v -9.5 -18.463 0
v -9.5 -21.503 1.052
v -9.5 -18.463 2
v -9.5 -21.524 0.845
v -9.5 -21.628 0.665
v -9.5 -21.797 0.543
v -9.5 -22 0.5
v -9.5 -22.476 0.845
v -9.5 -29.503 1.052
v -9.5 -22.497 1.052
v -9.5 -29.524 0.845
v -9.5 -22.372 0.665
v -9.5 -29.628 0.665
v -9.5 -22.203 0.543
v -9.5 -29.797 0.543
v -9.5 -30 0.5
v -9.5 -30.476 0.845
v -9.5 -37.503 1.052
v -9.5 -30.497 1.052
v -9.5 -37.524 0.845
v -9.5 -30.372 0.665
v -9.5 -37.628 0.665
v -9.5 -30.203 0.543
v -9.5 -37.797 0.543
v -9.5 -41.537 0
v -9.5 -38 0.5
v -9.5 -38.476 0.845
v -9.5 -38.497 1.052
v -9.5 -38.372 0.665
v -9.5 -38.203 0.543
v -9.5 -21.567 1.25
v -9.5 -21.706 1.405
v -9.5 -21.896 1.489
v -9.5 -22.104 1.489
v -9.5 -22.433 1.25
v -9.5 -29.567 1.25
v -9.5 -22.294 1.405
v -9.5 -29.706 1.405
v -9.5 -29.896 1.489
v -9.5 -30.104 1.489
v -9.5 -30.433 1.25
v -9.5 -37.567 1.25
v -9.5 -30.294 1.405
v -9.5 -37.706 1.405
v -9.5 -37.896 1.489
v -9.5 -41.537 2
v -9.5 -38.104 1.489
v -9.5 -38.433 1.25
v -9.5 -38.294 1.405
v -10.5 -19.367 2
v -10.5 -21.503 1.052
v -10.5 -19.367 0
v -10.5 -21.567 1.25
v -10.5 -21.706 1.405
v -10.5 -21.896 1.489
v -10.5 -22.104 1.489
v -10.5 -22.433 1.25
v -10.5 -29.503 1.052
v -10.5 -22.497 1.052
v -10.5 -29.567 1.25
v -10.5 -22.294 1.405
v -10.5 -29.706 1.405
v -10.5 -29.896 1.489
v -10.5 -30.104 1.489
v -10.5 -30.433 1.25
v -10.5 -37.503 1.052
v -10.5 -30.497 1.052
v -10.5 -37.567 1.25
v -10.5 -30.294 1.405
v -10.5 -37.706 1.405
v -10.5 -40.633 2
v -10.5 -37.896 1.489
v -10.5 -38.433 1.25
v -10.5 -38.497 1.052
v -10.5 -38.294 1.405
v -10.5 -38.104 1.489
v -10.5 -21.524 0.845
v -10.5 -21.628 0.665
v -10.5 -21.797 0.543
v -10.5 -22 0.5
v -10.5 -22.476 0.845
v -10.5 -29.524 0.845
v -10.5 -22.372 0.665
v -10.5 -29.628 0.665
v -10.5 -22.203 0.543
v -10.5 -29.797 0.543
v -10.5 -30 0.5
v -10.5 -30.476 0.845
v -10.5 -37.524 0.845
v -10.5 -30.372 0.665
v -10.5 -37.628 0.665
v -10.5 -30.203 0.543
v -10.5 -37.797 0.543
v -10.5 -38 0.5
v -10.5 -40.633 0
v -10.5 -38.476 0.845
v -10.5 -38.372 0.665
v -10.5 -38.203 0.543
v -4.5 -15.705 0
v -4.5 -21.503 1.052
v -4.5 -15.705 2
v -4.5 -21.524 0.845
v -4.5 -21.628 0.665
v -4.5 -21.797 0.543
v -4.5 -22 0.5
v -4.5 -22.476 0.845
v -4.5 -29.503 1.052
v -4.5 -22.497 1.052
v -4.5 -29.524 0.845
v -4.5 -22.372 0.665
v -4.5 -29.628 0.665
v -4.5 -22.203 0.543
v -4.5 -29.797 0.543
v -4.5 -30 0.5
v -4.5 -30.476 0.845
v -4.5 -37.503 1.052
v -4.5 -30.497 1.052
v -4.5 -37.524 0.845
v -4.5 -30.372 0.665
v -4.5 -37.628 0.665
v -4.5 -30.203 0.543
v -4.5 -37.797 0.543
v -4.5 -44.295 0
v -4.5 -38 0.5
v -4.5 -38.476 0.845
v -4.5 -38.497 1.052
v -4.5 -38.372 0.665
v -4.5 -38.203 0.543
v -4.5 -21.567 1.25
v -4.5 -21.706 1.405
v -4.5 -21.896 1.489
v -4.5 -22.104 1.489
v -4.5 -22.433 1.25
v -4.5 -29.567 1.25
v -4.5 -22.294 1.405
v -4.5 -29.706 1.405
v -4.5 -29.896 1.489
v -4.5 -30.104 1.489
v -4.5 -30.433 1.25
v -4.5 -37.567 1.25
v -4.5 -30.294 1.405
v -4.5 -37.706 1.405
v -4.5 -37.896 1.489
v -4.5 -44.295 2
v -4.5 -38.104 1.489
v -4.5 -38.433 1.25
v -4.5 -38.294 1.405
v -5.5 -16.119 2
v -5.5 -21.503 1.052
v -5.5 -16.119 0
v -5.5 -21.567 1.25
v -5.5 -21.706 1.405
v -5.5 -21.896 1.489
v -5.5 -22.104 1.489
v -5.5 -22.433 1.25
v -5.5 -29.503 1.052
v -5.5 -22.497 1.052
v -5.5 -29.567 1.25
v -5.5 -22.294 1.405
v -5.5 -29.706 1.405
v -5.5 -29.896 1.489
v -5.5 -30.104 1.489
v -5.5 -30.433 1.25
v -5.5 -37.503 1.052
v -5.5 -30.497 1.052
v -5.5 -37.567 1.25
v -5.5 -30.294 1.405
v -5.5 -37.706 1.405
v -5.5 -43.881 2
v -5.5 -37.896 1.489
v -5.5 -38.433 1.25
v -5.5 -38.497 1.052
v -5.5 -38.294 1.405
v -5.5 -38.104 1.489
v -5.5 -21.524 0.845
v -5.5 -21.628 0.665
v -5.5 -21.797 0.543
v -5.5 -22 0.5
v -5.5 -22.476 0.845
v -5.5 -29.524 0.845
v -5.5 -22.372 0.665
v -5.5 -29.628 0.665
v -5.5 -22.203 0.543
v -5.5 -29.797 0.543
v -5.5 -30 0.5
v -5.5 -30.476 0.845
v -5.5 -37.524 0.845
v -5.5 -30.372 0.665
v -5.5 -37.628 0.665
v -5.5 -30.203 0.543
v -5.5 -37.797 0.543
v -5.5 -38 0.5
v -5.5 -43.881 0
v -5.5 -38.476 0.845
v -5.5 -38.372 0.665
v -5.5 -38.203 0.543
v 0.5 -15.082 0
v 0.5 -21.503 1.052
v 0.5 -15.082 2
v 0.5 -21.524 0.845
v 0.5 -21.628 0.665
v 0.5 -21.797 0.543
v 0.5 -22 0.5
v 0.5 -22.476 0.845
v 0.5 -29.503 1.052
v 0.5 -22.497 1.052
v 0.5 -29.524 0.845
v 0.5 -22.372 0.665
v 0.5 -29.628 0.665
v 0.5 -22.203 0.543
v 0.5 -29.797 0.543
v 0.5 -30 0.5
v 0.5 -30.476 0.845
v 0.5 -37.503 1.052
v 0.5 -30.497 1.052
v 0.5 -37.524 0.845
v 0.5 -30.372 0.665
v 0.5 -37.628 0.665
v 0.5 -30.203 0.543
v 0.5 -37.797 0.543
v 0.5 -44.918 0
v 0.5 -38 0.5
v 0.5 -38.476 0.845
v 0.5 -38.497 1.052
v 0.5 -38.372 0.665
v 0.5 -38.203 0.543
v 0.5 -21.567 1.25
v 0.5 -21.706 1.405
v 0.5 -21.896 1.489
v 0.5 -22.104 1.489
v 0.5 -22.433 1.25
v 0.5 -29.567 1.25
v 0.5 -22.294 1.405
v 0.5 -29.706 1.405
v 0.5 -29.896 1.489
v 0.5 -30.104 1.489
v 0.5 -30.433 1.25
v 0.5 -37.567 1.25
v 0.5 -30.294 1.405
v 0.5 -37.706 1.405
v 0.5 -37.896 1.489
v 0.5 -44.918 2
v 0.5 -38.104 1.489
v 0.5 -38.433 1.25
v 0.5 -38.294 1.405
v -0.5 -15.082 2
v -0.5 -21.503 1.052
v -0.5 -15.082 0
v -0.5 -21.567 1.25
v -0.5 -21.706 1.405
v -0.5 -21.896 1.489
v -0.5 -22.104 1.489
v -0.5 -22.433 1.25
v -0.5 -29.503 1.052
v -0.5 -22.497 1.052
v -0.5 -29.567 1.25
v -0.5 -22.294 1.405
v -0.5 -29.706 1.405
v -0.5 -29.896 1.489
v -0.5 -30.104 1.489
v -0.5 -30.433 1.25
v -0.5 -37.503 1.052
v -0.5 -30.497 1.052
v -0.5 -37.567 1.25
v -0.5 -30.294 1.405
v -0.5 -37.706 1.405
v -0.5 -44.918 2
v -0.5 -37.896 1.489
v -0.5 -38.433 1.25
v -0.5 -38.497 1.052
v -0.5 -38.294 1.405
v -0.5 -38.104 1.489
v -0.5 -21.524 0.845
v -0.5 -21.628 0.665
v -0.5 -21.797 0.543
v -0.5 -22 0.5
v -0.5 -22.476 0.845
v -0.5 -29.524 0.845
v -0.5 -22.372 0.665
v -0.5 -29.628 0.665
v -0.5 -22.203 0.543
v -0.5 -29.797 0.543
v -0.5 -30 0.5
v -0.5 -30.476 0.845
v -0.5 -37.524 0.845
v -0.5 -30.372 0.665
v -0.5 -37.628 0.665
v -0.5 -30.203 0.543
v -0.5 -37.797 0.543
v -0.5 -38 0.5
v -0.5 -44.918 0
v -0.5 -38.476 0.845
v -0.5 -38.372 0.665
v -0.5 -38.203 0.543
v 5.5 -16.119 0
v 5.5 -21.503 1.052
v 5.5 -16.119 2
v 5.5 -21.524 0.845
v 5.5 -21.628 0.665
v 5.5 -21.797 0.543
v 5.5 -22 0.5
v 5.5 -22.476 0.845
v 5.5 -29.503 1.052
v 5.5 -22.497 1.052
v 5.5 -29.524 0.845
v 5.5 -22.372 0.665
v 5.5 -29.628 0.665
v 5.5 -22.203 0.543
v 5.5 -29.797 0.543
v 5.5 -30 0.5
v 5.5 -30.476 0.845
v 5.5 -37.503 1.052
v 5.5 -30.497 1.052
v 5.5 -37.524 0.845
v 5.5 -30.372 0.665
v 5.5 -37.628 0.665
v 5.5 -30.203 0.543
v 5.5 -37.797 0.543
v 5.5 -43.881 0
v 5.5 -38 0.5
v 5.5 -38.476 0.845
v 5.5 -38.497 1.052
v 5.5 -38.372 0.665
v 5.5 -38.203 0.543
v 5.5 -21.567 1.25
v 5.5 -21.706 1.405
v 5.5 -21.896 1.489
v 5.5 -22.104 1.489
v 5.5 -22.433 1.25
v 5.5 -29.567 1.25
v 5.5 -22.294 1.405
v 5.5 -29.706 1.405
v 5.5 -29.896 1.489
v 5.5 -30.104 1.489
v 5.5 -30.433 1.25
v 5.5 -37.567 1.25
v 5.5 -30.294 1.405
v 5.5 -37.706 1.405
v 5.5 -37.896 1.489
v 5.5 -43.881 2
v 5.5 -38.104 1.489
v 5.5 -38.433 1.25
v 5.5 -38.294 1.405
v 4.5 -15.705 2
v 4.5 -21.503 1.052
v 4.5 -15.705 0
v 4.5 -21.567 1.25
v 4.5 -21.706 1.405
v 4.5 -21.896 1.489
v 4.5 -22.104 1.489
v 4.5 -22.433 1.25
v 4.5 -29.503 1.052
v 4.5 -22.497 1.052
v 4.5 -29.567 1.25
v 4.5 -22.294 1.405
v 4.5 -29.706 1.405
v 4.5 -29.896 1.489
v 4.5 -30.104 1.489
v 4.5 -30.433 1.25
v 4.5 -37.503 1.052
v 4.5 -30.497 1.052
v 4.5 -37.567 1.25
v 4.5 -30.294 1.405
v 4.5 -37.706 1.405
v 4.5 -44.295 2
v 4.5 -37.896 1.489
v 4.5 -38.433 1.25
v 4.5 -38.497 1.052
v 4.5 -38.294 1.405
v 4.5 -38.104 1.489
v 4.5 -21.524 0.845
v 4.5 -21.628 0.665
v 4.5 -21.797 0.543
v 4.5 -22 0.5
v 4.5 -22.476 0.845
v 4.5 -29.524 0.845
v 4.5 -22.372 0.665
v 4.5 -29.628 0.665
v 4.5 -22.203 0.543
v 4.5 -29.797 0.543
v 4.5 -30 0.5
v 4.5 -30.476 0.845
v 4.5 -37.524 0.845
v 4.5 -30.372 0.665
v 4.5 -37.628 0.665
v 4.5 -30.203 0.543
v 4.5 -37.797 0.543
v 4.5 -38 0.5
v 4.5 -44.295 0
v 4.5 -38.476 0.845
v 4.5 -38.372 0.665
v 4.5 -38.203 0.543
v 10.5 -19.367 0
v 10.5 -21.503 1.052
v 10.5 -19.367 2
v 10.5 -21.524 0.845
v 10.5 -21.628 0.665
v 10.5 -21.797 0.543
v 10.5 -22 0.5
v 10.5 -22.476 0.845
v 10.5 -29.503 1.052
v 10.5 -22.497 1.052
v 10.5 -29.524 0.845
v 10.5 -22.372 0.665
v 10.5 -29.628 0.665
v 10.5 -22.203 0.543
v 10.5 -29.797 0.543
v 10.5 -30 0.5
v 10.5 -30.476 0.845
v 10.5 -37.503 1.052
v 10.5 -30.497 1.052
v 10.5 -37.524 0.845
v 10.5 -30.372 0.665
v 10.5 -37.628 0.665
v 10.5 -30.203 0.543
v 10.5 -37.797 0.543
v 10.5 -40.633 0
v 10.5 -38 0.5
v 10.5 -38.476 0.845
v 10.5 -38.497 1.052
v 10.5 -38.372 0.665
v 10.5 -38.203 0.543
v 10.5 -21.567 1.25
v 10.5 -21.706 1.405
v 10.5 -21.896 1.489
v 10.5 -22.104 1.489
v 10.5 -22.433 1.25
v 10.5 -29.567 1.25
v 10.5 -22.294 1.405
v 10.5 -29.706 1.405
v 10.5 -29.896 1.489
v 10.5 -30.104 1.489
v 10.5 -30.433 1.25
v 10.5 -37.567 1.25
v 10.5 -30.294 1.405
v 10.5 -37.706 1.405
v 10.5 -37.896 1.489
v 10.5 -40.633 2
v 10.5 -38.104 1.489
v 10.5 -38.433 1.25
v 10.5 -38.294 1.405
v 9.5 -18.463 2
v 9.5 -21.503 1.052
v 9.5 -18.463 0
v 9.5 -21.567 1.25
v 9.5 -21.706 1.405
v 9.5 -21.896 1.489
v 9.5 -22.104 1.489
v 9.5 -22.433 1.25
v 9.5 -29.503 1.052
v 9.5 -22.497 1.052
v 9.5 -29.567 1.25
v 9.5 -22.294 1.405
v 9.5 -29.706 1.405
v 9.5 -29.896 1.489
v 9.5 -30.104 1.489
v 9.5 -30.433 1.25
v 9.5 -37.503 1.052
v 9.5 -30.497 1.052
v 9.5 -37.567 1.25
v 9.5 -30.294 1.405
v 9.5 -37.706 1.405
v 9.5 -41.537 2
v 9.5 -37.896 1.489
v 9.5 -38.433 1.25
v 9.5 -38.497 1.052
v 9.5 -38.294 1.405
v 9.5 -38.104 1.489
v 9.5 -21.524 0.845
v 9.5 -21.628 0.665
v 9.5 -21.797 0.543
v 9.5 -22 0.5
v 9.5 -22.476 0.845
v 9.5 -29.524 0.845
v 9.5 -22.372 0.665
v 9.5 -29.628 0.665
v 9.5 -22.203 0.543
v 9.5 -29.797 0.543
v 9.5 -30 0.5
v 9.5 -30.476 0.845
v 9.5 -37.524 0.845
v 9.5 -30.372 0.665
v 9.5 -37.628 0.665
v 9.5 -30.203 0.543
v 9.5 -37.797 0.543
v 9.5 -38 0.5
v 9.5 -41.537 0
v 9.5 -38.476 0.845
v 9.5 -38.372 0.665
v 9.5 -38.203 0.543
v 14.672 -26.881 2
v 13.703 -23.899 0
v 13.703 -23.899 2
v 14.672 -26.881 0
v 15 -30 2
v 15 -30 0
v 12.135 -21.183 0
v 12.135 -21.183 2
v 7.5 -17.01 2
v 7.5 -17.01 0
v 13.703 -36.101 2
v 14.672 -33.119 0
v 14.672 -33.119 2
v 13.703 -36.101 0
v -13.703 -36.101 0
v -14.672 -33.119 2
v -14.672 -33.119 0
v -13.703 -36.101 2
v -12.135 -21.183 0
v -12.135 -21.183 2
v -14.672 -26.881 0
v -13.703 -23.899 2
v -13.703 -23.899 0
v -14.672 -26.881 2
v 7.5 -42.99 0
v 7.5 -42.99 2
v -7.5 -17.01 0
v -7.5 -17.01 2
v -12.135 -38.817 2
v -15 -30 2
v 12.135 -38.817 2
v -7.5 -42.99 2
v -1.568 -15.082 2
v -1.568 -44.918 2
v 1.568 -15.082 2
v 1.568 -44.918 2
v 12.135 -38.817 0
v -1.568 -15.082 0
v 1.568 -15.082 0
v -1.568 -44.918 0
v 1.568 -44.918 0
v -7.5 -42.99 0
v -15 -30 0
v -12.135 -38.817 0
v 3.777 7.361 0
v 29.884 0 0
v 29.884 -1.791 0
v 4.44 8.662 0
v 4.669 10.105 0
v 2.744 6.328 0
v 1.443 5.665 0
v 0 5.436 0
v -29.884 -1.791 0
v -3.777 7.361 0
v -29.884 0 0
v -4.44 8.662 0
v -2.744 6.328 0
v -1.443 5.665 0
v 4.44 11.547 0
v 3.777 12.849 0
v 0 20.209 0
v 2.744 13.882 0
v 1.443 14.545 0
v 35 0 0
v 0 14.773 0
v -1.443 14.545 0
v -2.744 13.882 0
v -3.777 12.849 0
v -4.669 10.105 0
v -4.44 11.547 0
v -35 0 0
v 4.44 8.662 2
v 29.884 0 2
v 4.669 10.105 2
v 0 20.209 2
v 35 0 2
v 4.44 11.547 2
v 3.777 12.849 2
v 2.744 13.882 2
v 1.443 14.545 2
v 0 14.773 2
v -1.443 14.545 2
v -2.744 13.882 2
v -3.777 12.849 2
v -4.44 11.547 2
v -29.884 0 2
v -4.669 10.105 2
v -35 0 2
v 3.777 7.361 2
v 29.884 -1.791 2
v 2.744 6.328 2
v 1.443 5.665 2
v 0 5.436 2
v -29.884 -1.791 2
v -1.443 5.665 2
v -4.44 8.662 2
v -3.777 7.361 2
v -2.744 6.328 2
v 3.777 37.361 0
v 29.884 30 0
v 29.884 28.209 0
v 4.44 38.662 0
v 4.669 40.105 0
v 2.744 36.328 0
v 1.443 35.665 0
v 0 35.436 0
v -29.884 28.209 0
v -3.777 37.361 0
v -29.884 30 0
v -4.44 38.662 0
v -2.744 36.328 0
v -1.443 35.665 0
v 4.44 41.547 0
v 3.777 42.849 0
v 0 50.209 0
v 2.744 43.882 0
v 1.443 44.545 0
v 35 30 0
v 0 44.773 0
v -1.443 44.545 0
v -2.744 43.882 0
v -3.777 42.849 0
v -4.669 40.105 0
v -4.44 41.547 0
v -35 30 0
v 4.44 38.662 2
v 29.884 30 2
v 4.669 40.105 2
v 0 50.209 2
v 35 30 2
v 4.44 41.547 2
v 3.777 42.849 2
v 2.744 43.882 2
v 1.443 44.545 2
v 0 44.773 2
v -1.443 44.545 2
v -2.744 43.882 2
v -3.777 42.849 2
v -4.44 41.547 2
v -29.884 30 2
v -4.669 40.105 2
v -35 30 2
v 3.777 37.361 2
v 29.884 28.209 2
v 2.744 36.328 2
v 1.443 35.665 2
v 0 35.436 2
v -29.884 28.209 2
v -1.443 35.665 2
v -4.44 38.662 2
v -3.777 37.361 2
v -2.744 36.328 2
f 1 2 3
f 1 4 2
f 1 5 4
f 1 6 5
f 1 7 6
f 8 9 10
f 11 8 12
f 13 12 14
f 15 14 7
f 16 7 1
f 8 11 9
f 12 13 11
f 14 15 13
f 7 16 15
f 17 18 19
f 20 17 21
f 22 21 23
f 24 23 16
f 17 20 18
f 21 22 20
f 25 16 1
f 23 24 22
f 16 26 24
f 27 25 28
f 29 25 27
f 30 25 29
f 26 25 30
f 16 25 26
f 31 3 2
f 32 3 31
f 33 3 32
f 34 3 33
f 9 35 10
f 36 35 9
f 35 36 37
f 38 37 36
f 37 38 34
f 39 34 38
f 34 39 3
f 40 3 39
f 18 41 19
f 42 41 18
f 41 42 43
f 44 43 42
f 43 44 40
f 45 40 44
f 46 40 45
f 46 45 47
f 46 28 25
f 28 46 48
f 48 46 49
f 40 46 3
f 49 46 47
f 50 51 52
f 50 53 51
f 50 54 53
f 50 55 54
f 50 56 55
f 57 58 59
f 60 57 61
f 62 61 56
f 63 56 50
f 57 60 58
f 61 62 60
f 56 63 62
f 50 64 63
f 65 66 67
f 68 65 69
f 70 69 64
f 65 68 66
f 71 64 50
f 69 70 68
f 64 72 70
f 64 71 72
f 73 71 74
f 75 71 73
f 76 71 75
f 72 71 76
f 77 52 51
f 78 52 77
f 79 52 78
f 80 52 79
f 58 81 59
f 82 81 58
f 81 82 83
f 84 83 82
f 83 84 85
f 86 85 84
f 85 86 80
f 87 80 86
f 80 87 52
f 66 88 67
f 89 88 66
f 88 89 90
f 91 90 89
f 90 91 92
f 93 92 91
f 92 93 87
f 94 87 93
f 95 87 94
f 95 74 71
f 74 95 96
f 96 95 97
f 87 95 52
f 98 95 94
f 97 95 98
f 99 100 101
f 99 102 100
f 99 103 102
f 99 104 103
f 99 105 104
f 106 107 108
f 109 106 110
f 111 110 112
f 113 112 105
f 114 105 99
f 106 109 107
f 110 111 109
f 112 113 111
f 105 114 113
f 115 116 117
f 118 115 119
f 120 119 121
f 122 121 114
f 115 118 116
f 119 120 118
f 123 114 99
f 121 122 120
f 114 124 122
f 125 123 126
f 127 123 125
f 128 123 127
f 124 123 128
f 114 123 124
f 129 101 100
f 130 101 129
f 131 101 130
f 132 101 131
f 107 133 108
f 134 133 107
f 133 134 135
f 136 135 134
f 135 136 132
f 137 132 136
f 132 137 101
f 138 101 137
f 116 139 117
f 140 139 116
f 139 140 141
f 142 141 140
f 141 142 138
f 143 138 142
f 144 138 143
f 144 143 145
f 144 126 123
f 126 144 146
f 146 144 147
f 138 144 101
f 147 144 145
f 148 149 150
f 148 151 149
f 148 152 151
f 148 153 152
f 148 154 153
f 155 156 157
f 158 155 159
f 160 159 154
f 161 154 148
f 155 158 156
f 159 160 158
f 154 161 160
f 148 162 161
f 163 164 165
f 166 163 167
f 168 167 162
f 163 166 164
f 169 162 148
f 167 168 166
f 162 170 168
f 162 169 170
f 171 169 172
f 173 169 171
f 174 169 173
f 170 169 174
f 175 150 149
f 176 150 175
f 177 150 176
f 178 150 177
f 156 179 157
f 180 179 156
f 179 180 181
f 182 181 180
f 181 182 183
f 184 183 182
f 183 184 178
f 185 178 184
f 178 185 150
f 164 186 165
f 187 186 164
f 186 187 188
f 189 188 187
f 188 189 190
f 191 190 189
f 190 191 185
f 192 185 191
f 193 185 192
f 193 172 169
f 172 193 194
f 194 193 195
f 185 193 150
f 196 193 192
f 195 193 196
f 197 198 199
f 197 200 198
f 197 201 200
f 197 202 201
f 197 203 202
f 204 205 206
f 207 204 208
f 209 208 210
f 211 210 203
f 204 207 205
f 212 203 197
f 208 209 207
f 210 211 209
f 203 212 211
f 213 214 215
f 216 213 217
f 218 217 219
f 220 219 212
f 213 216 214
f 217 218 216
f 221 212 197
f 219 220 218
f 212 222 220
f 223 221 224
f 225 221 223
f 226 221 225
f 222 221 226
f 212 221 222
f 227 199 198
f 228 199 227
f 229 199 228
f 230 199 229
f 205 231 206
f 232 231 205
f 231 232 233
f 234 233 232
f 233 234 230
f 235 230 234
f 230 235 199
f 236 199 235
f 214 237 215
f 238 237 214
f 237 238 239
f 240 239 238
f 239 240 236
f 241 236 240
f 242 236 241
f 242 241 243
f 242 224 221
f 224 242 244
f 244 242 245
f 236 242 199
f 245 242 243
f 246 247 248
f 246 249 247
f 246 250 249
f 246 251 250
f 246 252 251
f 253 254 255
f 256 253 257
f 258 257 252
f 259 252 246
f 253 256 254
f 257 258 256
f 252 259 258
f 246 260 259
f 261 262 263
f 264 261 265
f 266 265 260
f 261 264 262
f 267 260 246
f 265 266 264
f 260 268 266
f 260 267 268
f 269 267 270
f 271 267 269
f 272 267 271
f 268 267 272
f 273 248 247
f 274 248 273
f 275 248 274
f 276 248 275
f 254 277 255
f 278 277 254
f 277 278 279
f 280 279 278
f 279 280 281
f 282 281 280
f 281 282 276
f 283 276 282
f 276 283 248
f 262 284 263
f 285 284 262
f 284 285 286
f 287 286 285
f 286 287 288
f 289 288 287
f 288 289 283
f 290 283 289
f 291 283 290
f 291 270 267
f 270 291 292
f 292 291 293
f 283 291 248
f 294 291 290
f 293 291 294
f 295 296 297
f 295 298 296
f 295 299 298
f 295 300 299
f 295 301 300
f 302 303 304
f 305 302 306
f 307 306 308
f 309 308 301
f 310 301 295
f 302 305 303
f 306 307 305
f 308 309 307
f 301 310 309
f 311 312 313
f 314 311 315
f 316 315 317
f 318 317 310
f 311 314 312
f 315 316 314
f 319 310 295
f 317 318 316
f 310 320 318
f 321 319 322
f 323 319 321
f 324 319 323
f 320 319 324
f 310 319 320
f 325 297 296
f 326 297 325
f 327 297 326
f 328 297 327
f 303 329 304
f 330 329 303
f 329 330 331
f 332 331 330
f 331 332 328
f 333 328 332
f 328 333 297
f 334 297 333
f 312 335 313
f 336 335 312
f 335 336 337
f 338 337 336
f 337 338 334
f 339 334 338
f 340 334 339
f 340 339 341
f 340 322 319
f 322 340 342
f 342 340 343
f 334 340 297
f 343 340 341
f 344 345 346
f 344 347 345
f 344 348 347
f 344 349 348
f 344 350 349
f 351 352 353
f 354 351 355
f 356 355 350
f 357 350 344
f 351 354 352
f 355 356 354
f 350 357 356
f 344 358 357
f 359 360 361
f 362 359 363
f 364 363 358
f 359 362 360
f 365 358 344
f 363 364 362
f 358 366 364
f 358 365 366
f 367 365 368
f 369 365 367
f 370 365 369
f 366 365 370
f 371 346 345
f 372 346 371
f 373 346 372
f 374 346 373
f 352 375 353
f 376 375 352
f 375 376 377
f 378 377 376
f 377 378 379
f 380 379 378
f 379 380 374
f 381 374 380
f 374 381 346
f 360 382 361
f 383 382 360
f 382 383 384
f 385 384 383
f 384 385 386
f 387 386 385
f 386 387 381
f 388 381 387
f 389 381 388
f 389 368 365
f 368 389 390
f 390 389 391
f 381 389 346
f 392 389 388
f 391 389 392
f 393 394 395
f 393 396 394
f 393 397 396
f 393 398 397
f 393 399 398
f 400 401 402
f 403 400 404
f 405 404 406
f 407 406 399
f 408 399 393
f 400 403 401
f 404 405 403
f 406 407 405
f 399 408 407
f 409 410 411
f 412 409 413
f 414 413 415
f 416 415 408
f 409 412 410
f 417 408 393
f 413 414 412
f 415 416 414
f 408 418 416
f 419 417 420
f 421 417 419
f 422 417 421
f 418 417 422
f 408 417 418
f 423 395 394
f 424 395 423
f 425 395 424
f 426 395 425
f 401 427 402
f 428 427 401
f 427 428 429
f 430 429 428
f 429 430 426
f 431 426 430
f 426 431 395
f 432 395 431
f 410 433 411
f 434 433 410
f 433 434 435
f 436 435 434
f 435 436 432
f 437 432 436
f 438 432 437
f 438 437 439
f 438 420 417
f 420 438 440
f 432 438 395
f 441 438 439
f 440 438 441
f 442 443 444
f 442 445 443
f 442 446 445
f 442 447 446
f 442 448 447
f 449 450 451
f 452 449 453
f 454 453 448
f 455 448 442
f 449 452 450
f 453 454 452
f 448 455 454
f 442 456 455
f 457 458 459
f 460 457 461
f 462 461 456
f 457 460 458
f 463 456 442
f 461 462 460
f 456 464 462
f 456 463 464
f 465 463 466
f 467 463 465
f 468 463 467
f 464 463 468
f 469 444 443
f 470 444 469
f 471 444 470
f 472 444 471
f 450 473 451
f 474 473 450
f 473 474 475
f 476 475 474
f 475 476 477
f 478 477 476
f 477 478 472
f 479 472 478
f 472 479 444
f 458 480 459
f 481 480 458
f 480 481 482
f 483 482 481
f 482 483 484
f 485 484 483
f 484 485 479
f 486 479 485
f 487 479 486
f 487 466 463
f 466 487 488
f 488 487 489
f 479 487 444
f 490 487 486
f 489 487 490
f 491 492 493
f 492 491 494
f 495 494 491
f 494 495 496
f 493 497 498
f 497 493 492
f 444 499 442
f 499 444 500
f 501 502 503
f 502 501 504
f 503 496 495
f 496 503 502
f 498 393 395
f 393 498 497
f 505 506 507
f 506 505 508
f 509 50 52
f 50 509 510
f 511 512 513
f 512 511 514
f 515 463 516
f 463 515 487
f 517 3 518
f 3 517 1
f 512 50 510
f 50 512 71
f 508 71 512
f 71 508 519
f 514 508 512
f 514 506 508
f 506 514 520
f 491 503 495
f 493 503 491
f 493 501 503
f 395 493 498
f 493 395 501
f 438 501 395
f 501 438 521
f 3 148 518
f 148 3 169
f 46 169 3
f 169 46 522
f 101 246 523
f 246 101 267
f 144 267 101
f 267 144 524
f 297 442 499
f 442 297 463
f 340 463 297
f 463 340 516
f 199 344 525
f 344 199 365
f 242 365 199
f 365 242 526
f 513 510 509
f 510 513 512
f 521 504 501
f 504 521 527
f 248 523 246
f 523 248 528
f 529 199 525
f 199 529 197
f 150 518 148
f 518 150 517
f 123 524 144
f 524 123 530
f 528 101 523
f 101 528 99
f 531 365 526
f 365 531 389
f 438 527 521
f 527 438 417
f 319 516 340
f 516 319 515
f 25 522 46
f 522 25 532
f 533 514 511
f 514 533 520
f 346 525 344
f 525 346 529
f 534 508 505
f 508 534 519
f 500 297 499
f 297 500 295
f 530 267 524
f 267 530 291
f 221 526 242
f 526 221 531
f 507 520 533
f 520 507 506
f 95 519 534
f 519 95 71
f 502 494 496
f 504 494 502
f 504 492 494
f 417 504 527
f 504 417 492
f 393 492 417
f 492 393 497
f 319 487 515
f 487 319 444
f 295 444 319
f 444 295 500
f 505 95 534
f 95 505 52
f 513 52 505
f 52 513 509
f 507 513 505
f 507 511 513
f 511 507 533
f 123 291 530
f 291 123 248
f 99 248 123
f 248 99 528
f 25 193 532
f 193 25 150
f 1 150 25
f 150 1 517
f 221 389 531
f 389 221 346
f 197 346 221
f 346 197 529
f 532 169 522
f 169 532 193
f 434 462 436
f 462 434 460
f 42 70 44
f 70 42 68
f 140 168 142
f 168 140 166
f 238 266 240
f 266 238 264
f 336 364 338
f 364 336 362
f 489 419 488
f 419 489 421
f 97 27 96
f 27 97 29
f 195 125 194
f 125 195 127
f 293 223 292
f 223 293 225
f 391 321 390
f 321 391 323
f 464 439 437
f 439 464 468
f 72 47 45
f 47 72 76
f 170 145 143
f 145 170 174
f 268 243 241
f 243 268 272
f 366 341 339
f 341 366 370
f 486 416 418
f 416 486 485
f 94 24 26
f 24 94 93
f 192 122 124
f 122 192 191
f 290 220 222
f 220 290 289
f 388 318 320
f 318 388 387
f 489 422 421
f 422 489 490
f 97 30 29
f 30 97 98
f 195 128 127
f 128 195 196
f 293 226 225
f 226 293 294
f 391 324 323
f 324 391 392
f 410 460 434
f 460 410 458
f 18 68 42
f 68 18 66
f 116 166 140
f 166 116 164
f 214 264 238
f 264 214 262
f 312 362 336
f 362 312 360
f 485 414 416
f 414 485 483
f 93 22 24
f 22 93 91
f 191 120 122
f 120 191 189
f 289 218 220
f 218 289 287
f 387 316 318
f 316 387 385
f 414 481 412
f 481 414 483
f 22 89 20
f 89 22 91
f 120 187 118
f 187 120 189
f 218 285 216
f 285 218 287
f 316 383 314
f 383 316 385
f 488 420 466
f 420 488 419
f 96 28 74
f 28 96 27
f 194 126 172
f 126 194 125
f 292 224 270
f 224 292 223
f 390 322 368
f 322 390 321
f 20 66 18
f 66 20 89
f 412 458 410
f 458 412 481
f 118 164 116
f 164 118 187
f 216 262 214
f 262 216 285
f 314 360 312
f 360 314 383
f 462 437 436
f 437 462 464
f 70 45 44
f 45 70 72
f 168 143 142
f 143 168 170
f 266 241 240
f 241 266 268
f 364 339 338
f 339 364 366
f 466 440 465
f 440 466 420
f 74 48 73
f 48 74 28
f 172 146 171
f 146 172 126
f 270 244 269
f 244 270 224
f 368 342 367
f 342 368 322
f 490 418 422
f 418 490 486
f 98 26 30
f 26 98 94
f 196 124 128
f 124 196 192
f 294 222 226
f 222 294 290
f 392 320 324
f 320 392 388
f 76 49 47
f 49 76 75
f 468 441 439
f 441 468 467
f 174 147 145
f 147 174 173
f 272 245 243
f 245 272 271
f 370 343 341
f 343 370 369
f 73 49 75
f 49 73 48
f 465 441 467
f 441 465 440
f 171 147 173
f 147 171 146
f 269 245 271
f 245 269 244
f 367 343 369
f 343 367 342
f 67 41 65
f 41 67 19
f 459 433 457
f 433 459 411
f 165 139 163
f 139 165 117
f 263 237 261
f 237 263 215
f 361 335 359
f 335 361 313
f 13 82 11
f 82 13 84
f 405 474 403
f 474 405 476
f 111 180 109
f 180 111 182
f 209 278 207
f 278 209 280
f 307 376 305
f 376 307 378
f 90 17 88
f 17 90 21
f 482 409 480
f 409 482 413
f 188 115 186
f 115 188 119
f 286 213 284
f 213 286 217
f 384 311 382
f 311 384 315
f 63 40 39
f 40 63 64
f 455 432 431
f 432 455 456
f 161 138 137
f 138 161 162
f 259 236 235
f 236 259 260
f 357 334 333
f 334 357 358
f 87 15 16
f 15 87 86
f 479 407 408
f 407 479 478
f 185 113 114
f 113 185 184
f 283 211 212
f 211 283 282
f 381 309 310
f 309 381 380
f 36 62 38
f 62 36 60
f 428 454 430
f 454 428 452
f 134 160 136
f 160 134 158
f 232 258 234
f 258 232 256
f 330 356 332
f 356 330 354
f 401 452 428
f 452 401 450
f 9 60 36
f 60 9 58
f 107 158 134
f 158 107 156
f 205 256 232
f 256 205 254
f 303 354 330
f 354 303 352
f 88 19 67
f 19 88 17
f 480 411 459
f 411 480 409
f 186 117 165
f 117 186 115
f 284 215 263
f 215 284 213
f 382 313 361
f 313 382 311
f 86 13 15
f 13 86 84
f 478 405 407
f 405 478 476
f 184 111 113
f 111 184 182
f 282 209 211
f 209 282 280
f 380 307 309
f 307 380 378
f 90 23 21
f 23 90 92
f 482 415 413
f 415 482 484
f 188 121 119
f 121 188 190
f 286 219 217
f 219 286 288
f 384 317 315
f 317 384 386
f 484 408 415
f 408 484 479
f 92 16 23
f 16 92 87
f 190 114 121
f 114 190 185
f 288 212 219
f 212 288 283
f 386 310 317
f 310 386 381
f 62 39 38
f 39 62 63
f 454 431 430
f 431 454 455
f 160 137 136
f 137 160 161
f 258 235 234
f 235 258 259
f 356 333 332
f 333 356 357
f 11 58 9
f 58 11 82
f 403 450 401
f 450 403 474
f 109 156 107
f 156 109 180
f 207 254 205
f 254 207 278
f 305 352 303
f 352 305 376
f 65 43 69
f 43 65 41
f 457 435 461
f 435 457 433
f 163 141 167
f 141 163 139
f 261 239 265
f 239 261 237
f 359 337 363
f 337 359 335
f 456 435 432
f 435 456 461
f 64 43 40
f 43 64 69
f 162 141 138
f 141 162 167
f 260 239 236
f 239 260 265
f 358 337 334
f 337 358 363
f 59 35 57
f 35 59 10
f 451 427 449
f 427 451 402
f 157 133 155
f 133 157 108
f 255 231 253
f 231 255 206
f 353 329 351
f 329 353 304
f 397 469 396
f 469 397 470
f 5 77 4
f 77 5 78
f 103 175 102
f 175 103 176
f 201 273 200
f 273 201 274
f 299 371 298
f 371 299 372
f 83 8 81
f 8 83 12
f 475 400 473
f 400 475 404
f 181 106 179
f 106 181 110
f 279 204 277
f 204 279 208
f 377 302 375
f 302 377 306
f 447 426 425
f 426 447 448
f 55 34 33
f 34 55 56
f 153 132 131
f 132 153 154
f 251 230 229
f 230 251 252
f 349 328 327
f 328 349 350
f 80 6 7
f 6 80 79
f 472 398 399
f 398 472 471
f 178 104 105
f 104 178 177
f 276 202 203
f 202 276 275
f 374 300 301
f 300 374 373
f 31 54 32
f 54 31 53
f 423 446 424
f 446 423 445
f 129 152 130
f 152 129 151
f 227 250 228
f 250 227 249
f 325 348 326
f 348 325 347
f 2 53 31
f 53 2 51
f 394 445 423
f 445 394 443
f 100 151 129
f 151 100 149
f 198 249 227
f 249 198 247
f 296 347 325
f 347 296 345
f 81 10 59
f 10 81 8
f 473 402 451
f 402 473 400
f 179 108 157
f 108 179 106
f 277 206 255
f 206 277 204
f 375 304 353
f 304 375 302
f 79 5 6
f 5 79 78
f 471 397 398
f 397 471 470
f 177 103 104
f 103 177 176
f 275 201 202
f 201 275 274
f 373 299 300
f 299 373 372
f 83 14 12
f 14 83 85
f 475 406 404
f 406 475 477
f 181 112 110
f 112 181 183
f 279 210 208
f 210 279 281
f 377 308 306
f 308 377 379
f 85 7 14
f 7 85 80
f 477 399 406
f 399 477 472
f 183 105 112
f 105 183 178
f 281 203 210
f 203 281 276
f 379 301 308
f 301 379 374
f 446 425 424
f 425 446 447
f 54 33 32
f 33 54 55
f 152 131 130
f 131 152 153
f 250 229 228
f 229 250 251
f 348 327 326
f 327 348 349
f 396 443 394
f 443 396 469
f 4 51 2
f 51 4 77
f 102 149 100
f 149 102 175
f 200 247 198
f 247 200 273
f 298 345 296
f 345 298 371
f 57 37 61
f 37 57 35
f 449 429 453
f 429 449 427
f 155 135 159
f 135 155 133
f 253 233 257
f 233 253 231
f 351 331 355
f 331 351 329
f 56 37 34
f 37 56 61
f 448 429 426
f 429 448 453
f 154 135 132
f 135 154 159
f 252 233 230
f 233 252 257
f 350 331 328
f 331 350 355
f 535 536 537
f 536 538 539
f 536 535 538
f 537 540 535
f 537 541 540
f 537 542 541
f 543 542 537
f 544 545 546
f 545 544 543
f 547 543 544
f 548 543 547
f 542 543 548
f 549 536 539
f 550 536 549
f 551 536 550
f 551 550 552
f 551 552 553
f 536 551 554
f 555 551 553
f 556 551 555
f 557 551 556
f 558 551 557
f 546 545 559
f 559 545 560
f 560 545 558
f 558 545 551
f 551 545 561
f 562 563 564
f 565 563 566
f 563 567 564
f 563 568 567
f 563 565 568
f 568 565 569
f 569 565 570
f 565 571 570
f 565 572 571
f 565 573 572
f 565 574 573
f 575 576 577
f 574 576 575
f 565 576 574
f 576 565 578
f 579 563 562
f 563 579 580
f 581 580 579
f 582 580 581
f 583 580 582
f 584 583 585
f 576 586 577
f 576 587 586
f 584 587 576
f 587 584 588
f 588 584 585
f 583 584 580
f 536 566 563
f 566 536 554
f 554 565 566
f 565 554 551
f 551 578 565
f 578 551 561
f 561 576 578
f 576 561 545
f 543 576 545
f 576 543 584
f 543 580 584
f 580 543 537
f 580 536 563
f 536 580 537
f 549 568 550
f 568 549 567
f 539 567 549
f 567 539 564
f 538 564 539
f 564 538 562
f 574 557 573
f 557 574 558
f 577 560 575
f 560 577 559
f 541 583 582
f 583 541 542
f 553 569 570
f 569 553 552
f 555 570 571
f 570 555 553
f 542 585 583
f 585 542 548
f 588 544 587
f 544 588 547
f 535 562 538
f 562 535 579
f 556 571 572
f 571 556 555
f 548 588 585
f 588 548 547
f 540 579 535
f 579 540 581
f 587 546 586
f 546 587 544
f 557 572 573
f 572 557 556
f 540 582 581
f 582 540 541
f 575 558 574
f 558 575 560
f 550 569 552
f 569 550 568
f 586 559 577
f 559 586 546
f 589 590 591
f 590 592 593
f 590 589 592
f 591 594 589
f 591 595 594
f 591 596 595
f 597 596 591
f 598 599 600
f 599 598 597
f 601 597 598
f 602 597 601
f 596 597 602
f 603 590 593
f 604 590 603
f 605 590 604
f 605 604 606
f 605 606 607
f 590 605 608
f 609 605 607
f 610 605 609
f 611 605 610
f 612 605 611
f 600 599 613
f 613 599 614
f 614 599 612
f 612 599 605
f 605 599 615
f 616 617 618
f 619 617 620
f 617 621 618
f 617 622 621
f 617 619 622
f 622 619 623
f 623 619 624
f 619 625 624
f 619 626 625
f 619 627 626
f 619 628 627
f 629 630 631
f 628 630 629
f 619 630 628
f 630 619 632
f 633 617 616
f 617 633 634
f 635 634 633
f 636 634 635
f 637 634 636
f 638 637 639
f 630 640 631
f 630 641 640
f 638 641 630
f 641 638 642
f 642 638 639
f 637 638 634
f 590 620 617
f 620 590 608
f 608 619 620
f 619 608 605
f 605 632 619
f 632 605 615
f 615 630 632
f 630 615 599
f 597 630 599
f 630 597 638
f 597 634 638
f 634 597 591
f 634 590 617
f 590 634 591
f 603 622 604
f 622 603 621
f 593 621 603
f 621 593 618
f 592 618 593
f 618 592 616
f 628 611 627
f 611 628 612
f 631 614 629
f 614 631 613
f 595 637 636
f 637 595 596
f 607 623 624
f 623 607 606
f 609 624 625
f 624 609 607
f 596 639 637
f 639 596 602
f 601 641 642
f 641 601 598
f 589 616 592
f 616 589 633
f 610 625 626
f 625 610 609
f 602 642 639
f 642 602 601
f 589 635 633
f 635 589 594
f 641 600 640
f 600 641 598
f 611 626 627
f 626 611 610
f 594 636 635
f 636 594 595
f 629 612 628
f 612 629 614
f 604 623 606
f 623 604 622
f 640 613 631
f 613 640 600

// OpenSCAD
E = .02;

module slat(offset) {
    translate([offset * 5, 0, 0])
        cube([1, 30 + E, 2 + E], center=true);
}

module dowel(offset) {
    translate([0, offset * 8, 0])
        rotate([0, 90, 0])
            cylinder(h=21, r=0.5, center=true, $fn=15);
}

module table() {
    difference() {
        cylinder(h=2, r=15, center=true);
        for (i=[-2:2]) slat(i);
    }
    for (i=[-1:1]) dowel(i);
}

T = 15.8;
R = 1.4;
O = 4.0;
P_D = 7.3;
TAKEOFF = 22 / (T + R);
T_HEIGHT = TAKEOFF * T;
R_HEIGHT = TAKEOFF * R;
O_WIDTH = TAKEOFF * O;
P_RADIUS = TAKEOFF * P_D / 2;

PEAK_POINTS = [
    [-35, 0], [-35 + O_WIDTH, 0], [-35 + O_WIDTH, -R_HEIGHT],
    [35 - O_WIDTH, -R_HEIGHT], [35 - O_WIDTH, 0], [35, 0],
    [0, T_HEIGHT]
];

module peak() {
    difference() {
        linear_extrude(height=2) {
            polygon(points=PEAK_POINTS);
        }
        translate([0, T_HEIGHT / 2, -E])
            cylinder(h=2+2*E, r=P_RADIUS, $fn=20);
    }
}

echo([0:10]);

translate([0, -30, 1])
    table();

peak();

translate([0, 30, 0])
    peak();
